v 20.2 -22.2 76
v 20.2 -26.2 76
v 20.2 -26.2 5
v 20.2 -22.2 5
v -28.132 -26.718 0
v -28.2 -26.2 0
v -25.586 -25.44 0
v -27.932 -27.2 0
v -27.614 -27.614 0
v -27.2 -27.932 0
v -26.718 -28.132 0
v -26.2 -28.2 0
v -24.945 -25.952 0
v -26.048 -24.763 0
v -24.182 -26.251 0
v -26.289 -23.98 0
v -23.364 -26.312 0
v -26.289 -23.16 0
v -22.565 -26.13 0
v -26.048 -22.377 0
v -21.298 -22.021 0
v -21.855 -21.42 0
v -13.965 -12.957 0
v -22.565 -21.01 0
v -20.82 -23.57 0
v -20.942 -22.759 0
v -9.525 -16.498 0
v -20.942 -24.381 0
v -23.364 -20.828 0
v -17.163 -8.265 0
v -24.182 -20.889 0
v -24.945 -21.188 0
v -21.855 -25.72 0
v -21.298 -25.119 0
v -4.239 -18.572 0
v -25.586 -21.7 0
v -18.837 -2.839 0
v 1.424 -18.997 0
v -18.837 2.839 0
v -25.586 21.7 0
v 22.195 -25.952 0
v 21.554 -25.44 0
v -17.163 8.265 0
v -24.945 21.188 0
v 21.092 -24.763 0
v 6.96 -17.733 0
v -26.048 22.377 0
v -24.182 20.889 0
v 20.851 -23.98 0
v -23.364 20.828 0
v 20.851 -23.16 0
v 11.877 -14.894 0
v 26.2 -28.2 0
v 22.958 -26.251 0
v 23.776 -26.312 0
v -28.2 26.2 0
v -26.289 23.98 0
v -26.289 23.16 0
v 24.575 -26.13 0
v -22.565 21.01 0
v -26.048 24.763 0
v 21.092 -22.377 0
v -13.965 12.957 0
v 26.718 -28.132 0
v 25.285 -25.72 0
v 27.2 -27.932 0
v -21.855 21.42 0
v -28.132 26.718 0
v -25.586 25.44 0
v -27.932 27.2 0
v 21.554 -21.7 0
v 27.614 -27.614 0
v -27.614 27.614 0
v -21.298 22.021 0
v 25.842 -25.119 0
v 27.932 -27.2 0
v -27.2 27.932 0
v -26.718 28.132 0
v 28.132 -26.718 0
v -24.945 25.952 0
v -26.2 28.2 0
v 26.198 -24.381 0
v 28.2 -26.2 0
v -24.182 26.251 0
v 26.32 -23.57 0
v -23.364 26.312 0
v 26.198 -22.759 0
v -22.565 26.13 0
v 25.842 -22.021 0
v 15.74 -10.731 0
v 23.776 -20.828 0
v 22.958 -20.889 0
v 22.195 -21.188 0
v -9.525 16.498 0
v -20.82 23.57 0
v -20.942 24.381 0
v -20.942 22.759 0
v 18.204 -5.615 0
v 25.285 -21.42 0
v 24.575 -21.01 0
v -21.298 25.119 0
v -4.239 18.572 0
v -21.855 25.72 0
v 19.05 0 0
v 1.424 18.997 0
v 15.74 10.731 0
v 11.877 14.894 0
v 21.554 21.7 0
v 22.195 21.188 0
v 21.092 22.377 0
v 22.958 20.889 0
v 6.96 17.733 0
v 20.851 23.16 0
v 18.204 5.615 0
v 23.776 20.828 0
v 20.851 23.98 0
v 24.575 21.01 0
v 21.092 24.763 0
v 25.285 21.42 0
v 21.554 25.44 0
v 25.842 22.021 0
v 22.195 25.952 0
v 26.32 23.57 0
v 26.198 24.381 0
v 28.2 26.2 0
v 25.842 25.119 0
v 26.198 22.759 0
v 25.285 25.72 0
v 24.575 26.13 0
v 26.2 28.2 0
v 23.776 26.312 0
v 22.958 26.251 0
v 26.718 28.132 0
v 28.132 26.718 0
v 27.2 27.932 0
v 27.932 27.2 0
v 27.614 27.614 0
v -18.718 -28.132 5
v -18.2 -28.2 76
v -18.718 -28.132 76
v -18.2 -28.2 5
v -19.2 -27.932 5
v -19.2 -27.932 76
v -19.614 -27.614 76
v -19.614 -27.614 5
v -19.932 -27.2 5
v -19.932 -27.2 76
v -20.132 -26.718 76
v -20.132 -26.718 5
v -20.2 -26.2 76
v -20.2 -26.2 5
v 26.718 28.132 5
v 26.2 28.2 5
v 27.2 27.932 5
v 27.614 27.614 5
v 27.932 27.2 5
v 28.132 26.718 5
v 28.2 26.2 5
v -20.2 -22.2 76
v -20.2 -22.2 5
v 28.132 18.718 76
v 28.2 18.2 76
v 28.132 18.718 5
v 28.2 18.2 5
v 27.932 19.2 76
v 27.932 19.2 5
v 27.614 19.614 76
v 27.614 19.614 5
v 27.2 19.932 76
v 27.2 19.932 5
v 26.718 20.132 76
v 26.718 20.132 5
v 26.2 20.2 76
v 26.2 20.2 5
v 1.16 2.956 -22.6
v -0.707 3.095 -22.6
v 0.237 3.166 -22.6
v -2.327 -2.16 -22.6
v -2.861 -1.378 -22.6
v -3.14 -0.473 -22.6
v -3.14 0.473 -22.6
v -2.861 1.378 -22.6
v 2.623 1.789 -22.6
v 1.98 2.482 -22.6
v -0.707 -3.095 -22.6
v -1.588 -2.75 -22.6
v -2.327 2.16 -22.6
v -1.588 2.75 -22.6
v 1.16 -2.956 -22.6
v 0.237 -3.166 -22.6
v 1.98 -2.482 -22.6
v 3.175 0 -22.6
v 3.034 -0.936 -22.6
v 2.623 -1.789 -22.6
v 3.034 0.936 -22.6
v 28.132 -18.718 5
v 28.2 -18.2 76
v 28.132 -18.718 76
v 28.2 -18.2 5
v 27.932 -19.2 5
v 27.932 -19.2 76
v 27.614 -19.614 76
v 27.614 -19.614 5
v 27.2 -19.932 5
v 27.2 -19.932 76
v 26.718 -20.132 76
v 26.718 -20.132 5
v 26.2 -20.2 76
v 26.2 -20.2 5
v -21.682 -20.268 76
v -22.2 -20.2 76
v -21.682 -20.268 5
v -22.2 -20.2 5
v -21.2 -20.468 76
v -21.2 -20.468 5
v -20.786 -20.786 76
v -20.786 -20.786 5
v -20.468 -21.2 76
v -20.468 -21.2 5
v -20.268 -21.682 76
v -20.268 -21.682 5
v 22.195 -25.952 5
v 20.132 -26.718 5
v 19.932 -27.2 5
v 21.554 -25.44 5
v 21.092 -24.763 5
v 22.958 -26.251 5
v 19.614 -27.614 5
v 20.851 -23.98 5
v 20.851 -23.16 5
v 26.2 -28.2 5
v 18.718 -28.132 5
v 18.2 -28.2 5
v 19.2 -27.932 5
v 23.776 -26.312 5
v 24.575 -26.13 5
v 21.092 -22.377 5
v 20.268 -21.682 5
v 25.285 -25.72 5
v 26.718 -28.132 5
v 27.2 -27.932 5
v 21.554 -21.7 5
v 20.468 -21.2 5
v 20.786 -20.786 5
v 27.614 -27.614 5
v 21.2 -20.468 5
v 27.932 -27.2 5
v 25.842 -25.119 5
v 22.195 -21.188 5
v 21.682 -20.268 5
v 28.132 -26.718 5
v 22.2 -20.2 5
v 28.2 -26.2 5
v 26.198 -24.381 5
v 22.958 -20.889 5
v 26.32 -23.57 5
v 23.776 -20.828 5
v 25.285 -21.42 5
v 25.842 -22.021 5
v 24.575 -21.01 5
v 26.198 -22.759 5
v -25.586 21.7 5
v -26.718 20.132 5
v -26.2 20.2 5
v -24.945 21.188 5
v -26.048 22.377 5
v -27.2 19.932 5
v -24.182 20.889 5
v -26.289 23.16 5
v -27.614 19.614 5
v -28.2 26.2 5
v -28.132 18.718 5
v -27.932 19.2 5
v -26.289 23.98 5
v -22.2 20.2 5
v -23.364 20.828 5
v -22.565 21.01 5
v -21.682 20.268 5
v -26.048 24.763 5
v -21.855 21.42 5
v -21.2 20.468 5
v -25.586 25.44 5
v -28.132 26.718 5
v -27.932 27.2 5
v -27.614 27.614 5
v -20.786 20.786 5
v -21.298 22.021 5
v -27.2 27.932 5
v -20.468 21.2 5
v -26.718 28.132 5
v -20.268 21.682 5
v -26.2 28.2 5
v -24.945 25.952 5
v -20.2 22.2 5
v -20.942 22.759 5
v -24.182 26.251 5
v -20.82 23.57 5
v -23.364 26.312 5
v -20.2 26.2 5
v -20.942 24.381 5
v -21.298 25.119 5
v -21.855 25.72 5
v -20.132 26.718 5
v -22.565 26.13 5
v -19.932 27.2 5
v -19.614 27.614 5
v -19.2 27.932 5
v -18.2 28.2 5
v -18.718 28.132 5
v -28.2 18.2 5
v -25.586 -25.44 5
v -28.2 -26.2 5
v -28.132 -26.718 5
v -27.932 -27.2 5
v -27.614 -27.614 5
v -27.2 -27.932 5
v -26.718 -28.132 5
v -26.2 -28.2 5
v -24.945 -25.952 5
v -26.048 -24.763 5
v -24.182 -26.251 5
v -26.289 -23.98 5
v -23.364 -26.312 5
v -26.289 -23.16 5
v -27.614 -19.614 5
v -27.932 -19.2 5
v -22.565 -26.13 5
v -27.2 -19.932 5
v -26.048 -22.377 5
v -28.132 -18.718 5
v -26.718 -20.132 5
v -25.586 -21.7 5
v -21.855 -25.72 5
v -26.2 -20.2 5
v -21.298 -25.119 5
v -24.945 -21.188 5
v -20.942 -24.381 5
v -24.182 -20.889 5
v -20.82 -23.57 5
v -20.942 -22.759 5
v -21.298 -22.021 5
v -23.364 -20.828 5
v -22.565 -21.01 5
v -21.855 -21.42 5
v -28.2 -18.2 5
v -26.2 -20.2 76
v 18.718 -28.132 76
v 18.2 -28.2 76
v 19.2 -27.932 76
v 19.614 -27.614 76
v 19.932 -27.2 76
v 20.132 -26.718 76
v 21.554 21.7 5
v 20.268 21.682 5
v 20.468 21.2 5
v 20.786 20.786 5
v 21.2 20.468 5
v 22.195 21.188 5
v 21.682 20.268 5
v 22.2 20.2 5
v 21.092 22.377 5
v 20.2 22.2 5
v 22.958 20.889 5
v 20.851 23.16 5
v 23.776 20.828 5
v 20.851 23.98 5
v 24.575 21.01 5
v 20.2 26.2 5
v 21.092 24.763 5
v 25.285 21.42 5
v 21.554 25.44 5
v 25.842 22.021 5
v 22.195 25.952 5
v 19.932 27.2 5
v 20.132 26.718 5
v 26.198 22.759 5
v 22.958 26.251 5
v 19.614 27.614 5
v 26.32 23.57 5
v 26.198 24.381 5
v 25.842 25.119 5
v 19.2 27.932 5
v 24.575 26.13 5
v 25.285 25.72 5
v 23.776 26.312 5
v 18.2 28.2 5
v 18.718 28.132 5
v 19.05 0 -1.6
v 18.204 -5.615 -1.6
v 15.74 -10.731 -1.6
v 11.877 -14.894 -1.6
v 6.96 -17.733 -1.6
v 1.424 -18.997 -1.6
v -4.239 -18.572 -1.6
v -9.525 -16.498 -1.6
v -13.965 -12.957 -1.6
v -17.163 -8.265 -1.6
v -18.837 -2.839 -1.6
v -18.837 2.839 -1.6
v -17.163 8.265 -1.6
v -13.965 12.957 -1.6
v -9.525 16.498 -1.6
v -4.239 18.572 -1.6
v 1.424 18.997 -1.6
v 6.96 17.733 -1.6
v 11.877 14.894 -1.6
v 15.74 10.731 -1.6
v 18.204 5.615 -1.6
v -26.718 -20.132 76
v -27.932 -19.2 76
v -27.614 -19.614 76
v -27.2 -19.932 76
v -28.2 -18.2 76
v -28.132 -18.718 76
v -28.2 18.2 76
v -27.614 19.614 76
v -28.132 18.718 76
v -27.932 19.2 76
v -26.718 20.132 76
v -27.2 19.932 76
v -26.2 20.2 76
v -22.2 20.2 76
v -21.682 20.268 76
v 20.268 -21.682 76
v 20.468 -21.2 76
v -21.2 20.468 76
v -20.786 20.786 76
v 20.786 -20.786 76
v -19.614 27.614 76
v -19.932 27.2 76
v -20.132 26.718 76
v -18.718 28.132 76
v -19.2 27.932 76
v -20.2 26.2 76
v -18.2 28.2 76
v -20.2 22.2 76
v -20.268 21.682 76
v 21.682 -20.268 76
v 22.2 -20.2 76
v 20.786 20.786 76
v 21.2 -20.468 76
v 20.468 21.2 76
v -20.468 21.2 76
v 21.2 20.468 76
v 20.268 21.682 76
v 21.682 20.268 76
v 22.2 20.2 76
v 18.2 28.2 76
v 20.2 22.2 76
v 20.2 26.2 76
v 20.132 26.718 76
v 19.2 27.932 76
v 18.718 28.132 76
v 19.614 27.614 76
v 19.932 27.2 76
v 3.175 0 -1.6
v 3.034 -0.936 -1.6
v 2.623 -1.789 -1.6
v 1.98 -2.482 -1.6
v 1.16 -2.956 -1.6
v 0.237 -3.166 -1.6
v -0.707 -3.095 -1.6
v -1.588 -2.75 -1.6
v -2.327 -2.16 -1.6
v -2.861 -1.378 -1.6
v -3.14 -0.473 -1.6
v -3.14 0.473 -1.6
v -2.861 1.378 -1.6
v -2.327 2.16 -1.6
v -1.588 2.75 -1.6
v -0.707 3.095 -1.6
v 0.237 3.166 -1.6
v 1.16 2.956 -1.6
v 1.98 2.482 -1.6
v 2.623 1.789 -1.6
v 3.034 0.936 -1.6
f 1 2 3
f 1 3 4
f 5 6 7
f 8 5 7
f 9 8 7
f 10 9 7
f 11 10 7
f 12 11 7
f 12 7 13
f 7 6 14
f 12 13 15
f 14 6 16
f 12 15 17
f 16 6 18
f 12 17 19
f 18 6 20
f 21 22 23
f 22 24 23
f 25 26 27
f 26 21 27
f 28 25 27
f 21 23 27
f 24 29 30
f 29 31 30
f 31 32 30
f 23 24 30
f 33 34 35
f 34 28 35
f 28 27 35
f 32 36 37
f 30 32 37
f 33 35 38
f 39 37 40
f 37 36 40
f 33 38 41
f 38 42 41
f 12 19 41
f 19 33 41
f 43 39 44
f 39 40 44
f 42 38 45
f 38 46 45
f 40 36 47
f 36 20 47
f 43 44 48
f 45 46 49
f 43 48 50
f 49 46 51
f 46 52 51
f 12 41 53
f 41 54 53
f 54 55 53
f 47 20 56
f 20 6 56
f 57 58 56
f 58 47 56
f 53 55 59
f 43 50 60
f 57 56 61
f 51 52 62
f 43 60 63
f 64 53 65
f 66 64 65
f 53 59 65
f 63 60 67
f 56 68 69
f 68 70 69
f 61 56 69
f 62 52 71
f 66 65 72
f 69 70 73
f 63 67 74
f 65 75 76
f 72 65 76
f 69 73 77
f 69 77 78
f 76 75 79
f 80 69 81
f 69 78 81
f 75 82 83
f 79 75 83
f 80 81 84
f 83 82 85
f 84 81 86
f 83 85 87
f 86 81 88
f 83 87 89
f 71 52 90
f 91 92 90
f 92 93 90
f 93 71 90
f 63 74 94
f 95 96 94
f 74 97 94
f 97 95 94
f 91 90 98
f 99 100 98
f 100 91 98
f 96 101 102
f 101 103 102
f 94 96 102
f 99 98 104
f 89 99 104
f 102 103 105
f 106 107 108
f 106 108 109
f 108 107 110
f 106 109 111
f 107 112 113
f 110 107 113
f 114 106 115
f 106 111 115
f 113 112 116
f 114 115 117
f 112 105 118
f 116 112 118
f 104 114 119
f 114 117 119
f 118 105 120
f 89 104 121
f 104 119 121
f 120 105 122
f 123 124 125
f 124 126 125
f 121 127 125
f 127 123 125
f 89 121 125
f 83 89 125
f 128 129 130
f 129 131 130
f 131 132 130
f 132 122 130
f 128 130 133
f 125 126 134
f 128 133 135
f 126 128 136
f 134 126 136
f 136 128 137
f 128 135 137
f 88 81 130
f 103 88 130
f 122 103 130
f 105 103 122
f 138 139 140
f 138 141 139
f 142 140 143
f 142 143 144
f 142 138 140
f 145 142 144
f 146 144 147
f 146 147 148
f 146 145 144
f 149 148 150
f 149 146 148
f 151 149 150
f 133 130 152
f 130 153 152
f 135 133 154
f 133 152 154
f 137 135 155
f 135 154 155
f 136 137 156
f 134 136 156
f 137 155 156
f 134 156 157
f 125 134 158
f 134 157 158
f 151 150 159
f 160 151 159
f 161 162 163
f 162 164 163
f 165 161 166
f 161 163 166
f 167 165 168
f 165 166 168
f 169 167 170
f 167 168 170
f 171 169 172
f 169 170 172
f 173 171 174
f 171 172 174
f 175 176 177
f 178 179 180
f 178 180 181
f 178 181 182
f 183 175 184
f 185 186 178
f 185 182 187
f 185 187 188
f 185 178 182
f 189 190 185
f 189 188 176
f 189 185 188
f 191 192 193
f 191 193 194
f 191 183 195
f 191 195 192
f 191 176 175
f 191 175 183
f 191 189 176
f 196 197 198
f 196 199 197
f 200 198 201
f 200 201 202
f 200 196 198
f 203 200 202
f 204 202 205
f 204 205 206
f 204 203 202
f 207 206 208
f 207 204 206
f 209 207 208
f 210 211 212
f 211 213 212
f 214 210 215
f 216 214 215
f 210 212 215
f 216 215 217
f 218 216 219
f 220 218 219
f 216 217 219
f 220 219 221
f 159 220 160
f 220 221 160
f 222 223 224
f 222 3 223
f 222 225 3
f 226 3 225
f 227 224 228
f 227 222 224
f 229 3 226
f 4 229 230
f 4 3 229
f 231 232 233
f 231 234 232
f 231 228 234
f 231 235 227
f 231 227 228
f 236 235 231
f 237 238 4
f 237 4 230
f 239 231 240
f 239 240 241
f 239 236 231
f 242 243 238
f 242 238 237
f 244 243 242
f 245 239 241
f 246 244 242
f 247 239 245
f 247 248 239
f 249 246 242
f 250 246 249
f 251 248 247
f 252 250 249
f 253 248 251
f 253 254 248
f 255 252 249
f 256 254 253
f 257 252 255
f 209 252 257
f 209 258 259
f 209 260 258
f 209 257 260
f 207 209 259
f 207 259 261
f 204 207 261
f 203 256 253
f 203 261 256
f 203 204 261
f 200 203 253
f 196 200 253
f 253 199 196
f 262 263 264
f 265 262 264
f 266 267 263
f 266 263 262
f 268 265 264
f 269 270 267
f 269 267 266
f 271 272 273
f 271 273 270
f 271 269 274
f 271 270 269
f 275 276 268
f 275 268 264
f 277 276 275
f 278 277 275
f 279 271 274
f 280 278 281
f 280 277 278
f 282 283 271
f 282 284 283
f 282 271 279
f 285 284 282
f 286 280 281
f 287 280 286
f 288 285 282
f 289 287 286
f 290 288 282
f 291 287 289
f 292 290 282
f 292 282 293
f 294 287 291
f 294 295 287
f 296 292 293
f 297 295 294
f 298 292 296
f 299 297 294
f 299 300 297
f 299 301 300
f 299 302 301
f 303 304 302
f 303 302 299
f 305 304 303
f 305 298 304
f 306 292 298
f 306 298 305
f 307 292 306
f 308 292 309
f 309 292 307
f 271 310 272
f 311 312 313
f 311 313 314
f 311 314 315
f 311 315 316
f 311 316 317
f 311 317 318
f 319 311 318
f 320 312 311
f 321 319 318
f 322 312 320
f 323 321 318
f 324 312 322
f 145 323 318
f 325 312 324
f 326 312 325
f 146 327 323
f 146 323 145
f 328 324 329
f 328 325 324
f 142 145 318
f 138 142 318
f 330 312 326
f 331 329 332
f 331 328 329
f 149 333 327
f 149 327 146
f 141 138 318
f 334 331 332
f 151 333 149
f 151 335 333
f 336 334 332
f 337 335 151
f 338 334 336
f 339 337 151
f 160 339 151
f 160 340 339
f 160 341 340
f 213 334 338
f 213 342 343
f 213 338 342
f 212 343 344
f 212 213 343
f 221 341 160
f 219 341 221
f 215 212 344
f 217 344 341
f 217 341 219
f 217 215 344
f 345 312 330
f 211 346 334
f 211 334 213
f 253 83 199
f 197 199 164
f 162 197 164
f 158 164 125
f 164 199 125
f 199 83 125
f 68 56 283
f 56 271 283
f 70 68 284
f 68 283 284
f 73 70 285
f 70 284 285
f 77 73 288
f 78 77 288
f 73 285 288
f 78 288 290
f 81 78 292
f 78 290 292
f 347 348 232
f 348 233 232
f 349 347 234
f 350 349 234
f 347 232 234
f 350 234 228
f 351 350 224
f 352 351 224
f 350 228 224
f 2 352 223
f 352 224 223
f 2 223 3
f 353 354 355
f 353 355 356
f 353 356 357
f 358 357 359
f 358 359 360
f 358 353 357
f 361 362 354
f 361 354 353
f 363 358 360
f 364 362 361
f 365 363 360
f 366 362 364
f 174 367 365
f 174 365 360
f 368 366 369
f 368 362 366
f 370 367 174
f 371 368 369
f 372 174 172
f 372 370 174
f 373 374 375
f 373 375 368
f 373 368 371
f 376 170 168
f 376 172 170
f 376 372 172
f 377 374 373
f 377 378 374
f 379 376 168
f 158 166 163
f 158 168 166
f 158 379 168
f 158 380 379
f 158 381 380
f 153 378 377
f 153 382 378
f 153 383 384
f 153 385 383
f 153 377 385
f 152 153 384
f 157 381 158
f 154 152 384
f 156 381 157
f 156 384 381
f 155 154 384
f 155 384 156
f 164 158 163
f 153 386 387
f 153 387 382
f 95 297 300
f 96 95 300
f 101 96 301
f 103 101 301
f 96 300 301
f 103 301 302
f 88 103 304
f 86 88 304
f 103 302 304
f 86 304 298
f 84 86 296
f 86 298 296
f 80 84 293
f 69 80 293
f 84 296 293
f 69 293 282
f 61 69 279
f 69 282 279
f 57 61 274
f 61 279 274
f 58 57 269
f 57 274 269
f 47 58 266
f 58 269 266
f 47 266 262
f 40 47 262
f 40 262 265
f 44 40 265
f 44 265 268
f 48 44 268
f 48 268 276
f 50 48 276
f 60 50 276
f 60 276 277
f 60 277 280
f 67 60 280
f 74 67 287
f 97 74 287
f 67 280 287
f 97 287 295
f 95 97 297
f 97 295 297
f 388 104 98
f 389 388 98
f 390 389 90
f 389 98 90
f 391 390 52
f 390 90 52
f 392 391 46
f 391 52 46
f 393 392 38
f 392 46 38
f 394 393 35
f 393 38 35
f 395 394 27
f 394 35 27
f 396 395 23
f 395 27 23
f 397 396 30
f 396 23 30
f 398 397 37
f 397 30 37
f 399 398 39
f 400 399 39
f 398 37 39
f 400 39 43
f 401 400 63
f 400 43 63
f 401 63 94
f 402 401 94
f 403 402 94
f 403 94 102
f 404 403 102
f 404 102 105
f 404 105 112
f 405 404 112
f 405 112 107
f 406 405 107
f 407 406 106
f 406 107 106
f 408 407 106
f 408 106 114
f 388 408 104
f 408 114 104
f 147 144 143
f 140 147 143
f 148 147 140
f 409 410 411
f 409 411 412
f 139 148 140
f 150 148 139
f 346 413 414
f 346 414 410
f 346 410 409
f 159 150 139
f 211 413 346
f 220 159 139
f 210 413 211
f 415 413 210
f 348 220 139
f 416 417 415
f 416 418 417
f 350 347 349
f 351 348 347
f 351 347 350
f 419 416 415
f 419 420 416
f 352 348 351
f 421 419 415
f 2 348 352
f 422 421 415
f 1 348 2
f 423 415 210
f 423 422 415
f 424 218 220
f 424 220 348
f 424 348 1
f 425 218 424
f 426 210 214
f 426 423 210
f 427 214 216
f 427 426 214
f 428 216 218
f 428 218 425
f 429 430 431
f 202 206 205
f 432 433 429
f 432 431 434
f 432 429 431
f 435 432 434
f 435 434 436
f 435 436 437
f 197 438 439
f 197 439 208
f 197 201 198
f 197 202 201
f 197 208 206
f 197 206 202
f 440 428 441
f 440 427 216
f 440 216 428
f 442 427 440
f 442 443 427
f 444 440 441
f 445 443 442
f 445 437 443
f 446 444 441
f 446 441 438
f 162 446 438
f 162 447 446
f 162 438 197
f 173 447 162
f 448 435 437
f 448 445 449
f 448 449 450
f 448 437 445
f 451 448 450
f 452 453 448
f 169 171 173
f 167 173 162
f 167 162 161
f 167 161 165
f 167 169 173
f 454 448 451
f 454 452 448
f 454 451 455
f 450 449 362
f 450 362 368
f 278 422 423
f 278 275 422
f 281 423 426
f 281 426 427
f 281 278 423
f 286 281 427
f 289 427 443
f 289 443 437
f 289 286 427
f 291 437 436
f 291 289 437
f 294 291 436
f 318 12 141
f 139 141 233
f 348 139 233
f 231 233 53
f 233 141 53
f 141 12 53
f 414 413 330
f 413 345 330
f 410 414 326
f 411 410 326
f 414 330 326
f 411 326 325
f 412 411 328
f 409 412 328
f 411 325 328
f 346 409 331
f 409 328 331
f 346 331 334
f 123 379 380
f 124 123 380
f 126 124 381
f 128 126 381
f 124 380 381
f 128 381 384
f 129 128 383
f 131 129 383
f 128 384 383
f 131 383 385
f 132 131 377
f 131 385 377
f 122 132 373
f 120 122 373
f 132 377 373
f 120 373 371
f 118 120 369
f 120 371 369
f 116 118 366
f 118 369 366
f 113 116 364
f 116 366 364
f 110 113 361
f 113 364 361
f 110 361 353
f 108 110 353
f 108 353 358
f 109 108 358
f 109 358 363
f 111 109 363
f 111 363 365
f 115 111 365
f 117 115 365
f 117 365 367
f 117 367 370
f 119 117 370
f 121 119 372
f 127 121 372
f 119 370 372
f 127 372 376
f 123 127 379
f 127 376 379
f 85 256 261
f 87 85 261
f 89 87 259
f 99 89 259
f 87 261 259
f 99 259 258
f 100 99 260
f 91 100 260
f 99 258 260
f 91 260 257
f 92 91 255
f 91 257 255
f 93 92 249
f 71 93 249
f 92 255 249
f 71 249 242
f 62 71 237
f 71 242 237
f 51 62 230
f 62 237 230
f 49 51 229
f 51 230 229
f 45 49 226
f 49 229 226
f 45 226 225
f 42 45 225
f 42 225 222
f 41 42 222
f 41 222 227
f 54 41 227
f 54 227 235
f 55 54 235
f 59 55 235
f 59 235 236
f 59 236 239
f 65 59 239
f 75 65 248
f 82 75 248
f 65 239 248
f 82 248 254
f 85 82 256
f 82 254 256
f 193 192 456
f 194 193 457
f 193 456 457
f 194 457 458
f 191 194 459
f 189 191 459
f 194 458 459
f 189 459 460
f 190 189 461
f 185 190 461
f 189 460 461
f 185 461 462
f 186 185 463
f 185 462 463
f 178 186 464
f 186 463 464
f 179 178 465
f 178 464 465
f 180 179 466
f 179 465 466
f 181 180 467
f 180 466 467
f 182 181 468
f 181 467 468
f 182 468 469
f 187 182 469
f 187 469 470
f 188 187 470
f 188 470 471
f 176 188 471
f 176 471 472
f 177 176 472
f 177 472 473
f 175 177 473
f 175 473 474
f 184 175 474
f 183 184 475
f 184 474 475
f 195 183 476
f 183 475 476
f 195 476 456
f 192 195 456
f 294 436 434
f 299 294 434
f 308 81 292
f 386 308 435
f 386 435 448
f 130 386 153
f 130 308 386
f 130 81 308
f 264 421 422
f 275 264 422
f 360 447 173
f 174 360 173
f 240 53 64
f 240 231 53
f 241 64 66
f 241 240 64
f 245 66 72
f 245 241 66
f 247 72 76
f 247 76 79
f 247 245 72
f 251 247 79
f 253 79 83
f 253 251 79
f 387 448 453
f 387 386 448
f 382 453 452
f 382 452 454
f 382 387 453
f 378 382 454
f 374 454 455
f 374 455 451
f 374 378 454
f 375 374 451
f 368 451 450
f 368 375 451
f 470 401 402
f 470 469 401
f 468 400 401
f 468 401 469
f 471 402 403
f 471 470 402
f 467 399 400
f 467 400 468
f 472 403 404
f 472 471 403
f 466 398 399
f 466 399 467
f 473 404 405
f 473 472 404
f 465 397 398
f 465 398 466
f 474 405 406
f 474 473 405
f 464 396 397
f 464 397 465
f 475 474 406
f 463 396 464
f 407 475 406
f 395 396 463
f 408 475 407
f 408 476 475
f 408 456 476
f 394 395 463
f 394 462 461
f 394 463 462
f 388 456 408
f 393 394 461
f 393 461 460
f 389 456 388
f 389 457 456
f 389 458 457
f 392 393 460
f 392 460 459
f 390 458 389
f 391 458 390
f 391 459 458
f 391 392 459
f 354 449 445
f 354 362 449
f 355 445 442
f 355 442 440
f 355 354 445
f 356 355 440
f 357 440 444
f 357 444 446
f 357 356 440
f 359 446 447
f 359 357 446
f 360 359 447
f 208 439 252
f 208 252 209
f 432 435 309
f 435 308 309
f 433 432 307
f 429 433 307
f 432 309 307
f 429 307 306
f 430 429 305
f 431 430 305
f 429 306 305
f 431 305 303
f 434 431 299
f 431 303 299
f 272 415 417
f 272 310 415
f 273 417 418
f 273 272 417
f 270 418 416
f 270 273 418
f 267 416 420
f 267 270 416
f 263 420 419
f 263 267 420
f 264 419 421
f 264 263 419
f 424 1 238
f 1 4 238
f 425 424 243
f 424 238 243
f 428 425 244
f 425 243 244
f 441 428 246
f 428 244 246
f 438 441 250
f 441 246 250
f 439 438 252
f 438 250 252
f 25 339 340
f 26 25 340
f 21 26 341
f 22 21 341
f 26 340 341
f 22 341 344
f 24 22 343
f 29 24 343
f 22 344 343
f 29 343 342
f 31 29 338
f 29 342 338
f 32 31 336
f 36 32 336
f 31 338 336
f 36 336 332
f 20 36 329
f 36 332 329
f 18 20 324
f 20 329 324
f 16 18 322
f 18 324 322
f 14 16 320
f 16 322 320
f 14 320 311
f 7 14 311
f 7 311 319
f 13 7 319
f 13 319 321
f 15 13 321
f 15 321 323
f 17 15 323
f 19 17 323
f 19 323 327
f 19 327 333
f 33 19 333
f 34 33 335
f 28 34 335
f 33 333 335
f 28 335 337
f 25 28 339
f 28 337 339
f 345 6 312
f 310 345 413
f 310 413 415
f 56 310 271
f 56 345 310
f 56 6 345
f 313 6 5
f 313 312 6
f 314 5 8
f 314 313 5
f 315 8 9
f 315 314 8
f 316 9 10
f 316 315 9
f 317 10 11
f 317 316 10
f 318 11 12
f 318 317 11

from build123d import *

# Parameters (mm, degrees)
SKETCH1_W        = 56.4
SKETCH1_H        = 56.4
EXTRUSION1_DEPTH = 76
THREAD4_D        = 5.5
THREAD4_DEPTH    = 8
THREAD4_TIP      = 1.652366702
SKETCH4_R        = 19.05
EXTRUSION2_DEPTH = 1.6
SKETCH5_R        = 3.175
EXTRUSION3_DEPTH = 21
SKETCH6_W        = 8
SKETCH6_H        = 8
EXTRUSION4_DEPTH = 71
FILLET1_R        = 2
FILLET2_R        = 2


with BuildPart() as part:
    # Sketch1 → Extrusion1 (new body)
    with BuildSketch(Plane.XY):
        Rectangle(SKETCH1_W, SKETCH1_H)
    extrude(amount=EXTRUSION1_DEPTH)

    # Thread4
    with Locations(Plane(origin=(0, 0, 0), x_dir=(-1, 0, 0), z_dir=(0, 0, -1))):
        with Locations((-23.57, 23.57), (23.57, 23.57), (23.57, -23.57), (-23.57, -23.57)):
            Hole(THREAD4_D / 2, depth=THREAD4_DEPTH)
            with Locations((0, 0, -(THREAD4_DEPTH + THREAD4_TIP / 2))):  # 118° drill point
                Cone(0, THREAD4_D / 2, THREAD4_TIP, mode=Mode.SUBTRACT)

    # Sketch4 → Extrusion2 (add)
    with BuildSketch(Plane(origin=(0, 0, 0), x_dir=(-1, 0, 0), z_dir=(0, 0, -1))):
        with Locations(Location((0, 0, 0), (0, 0, 180))):
            Circle(SKETCH4_R)
    extrude(amount=EXTRUSION2_DEPTH)

    # Sketch5 → Extrusion3 (add)
    with BuildSketch(Plane(origin=(0, 0, -1.6), x_dir=(-1, 0, 0), z_dir=(0, 0, -1))):
        with Locations(Location((0, 0, 0), (0, 0, 180))):
            Circle(SKETCH5_R)
    extrude(amount=EXTRUSION3_DEPTH)

    # Sketch6 → Extrusion4 (cut)
    with BuildSketch(Plane.XY.offset(76)):
        with Locations((-24.2, -24.2)):
            Rectangle(SKETCH6_W, SKETCH6_H)
        with Locations((24.2, -24.2)):
            Rectangle(SKETCH6_W, SKETCH6_H)
        with Locations((24.2, 24.2)):
            Rectangle(SKETCH6_W, SKETCH6_H)
        with Locations((-24.2, 24.2)):
            Rectangle(SKETCH6_W, SKETCH6_H)
    extrude(amount=-EXTRUSION4_DEPTH, mode=Mode.SUBTRACT)

    # Fillet1
    fillet1_edges = [part.edges().sort_by_distance(p)[0] for p in [
        (-28.2, 28.2, 2.5),
    ]]
    fillet(fillet1_edges, radius=FILLET1_R)

    # Fillet2
    fillet2_edges = [part.edges().sort_by_distance(p)[0] for p in [
        (-28.2, -28.2, 2.5),
        (-20.2, -20.2, 40.5),
        (-20.2, -28.2, 40.5),
        (-28.2, -20.2, 40.5),
        (28.2, -28.2, 2.5),
        (20.2, -20.2, 40.5),
        (28.2, -20.2, 40.5),
        (20.2, -28.2, 40.5),
        (28.2, 28.2, 2.5),
        (20.2, 20.2, 40.5),
        (20.2, 28.2, 40.5),
        (28.2, 20.2, 40.5),
        (-20.2, 20.2, 40.5),
        (-28.2, 20.2, 40.5),
        (-20.2, 28.2, 40.5),
    ]]
    fillet(fillet2_edges, radius=FILLET2_R)


solid = part.part
